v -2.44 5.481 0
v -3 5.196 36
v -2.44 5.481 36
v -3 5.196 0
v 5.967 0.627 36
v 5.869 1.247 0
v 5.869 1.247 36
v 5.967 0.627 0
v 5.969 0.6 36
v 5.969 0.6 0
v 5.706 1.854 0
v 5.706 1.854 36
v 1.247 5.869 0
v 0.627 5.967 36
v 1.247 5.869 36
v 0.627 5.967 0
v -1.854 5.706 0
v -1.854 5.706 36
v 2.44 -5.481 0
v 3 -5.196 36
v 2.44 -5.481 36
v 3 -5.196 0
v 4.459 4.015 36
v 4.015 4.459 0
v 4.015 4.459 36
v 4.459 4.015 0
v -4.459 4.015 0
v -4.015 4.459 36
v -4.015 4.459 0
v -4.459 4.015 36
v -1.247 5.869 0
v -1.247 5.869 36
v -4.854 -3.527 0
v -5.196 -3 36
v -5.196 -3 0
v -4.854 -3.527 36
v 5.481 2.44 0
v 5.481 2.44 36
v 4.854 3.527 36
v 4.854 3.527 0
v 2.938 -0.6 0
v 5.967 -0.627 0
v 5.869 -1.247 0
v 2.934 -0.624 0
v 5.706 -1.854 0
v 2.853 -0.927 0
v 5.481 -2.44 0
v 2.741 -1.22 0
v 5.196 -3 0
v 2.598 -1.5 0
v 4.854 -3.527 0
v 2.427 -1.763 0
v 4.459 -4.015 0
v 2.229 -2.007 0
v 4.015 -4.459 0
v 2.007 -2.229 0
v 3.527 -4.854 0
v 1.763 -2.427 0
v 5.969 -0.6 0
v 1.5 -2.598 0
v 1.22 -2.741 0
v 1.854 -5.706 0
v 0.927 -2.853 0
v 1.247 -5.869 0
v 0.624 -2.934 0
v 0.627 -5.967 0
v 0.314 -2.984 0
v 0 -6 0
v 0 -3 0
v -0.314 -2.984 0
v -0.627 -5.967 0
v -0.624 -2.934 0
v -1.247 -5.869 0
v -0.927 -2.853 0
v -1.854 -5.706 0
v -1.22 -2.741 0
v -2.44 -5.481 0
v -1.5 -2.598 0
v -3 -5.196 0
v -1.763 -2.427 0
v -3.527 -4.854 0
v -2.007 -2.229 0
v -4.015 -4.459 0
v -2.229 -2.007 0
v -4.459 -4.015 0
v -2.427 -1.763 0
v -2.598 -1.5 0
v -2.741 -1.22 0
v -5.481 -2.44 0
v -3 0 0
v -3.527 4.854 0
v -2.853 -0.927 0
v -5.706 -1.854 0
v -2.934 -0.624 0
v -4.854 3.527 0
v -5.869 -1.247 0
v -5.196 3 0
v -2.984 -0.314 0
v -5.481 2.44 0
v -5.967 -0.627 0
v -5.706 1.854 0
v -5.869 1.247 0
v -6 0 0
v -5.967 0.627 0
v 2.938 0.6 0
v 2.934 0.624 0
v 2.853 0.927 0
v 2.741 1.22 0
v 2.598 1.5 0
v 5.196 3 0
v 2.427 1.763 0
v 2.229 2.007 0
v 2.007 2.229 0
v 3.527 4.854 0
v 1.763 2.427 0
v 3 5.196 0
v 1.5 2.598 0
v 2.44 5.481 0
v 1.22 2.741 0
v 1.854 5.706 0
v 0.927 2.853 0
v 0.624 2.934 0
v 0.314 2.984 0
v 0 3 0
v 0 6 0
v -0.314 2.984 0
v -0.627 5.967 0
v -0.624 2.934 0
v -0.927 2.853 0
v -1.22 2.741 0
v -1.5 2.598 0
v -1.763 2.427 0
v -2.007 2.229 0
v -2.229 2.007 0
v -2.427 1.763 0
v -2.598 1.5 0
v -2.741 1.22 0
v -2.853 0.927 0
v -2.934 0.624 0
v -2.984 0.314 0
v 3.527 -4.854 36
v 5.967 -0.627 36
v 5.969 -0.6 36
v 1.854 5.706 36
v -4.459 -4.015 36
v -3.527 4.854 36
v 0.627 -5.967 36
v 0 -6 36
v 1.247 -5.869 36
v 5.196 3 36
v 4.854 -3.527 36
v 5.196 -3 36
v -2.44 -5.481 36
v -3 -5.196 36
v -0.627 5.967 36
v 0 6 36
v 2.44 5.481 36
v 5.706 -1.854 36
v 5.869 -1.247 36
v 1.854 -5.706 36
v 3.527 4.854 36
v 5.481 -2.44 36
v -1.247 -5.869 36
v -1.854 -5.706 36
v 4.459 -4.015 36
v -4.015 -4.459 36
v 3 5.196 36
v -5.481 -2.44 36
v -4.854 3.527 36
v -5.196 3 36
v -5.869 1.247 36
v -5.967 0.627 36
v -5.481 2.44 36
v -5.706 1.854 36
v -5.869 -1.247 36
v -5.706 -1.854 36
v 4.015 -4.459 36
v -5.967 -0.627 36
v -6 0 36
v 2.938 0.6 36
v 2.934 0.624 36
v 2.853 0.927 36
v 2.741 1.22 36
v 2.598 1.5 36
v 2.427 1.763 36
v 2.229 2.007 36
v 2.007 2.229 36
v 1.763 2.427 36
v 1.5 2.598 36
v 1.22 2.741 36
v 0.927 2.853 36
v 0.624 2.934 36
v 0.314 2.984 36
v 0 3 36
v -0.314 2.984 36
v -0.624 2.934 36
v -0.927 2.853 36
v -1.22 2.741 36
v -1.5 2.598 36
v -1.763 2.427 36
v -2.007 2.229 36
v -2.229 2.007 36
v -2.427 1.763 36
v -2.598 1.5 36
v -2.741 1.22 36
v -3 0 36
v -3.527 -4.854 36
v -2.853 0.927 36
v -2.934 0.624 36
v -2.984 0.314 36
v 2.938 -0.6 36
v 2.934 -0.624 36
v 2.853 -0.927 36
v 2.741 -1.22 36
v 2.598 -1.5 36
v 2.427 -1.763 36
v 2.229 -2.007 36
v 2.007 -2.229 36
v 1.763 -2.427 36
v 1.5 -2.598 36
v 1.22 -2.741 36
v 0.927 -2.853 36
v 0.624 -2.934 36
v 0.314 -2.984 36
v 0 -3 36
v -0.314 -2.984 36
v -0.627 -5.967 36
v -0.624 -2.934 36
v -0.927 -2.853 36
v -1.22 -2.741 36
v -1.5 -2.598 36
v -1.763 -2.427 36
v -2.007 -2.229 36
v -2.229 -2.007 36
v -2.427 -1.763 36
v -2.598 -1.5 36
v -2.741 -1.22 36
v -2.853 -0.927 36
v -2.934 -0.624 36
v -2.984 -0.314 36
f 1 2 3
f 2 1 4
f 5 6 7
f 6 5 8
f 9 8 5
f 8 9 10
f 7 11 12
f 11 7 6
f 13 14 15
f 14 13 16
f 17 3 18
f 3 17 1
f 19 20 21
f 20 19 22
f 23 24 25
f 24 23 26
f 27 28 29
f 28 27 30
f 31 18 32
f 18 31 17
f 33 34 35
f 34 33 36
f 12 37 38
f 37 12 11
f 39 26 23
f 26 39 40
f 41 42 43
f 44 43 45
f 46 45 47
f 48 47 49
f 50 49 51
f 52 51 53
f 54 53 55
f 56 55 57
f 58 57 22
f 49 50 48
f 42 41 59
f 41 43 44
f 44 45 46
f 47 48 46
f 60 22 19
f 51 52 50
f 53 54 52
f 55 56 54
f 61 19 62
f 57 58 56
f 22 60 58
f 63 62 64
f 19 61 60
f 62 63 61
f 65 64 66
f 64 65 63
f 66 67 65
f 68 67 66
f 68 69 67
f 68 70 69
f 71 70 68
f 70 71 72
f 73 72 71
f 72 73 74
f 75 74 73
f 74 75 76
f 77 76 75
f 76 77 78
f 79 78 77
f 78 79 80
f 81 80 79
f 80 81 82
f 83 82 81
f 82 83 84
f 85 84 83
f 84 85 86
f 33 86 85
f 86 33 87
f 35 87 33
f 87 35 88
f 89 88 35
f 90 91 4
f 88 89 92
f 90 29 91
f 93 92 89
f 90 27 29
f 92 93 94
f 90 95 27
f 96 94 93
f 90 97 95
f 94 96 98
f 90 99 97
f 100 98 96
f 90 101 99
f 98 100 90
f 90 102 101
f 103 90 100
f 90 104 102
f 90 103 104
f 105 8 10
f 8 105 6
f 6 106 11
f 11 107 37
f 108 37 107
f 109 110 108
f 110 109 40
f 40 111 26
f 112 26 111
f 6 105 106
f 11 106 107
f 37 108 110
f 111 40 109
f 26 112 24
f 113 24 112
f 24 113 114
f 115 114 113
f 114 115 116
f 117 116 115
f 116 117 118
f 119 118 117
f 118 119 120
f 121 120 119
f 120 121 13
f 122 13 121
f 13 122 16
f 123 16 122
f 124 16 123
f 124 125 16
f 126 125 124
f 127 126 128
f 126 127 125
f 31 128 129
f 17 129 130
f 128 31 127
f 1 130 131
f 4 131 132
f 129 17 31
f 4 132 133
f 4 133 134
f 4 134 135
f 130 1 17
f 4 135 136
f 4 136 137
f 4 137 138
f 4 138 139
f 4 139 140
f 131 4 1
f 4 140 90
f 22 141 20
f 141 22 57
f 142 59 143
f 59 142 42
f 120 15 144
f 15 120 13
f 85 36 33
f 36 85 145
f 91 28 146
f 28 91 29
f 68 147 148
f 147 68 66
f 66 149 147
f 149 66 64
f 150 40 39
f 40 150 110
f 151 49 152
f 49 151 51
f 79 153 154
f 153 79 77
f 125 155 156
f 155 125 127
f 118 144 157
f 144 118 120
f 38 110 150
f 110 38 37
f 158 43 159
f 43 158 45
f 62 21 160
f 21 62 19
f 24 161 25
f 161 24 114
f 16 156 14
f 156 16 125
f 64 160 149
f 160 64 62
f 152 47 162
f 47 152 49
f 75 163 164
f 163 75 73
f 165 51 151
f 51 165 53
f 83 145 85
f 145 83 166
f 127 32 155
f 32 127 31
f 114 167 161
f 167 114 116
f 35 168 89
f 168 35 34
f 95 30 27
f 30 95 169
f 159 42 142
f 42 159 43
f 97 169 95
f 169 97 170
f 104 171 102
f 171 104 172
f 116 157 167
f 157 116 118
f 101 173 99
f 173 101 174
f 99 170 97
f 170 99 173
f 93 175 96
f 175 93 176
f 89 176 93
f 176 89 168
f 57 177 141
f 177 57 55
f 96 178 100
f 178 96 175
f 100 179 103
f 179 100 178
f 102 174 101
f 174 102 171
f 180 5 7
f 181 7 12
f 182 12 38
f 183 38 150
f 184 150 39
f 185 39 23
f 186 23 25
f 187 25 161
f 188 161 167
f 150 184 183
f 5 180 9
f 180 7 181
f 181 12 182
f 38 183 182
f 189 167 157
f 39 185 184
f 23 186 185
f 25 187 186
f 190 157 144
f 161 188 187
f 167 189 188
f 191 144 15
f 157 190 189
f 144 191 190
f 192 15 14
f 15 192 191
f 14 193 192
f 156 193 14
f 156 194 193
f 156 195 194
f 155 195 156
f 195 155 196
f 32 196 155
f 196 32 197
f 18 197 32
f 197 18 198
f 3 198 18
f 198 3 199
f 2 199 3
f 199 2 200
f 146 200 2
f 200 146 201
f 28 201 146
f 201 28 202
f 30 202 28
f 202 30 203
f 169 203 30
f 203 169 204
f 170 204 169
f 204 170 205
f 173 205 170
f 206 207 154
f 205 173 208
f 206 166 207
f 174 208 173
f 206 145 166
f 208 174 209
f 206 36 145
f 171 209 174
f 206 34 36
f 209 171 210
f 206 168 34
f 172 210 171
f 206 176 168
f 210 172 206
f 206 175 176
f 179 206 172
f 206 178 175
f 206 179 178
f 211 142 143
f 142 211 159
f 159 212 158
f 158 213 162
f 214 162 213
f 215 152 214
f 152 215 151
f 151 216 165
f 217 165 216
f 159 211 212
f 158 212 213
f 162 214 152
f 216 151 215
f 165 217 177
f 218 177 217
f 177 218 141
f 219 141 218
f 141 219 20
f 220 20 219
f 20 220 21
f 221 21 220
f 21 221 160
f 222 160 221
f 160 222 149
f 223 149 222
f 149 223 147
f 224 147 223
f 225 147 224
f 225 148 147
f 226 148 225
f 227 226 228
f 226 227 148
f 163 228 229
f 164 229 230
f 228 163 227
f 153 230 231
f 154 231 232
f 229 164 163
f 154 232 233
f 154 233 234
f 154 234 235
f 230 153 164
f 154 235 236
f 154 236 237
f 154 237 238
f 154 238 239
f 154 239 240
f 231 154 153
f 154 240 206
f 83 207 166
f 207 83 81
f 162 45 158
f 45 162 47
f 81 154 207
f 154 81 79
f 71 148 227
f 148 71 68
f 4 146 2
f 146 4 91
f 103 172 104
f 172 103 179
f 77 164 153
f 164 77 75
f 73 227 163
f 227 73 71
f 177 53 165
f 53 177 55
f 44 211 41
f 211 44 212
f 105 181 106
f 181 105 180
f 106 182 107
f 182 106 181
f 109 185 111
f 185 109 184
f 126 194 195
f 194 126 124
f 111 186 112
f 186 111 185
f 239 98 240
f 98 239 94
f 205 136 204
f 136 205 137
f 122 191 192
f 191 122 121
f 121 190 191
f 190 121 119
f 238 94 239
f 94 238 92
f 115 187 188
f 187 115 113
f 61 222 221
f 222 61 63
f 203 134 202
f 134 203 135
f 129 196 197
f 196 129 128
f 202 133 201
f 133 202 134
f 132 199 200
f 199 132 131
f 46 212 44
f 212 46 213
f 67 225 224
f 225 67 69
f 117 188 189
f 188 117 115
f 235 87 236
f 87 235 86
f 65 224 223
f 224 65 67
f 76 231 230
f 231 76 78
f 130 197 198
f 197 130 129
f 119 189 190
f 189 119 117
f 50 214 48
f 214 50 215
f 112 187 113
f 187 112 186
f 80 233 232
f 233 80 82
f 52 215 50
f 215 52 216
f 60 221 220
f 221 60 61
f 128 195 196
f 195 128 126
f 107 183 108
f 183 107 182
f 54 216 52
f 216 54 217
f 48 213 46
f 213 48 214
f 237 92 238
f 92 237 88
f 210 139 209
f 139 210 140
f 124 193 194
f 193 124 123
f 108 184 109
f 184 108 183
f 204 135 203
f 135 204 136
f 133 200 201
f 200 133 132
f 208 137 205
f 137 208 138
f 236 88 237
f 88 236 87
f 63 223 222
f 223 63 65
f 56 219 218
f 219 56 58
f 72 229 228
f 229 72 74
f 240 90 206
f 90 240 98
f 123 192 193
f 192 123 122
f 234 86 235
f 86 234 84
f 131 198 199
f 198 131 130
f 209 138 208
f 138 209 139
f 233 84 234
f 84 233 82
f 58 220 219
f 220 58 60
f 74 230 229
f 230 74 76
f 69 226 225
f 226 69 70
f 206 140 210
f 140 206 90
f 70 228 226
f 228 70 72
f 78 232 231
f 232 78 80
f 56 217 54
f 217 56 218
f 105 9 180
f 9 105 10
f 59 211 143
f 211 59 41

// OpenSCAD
// Slotted spring pin sleeve.
$fn = 60;
eps = 0.02;
inner_d = 6;
outer_d = 12;
length = 36;
slot_w = 1.2;
difference() {
    cylinder(d = outer_d, h = length);
    translate([0, 0, -eps]) cylinder(d = inner_d, h = length + 2 * eps);
    translate([0, -slot_w / 2, -eps]) cube([outer_d / 2 + eps, slot_w, length + 2 * eps]);
}
